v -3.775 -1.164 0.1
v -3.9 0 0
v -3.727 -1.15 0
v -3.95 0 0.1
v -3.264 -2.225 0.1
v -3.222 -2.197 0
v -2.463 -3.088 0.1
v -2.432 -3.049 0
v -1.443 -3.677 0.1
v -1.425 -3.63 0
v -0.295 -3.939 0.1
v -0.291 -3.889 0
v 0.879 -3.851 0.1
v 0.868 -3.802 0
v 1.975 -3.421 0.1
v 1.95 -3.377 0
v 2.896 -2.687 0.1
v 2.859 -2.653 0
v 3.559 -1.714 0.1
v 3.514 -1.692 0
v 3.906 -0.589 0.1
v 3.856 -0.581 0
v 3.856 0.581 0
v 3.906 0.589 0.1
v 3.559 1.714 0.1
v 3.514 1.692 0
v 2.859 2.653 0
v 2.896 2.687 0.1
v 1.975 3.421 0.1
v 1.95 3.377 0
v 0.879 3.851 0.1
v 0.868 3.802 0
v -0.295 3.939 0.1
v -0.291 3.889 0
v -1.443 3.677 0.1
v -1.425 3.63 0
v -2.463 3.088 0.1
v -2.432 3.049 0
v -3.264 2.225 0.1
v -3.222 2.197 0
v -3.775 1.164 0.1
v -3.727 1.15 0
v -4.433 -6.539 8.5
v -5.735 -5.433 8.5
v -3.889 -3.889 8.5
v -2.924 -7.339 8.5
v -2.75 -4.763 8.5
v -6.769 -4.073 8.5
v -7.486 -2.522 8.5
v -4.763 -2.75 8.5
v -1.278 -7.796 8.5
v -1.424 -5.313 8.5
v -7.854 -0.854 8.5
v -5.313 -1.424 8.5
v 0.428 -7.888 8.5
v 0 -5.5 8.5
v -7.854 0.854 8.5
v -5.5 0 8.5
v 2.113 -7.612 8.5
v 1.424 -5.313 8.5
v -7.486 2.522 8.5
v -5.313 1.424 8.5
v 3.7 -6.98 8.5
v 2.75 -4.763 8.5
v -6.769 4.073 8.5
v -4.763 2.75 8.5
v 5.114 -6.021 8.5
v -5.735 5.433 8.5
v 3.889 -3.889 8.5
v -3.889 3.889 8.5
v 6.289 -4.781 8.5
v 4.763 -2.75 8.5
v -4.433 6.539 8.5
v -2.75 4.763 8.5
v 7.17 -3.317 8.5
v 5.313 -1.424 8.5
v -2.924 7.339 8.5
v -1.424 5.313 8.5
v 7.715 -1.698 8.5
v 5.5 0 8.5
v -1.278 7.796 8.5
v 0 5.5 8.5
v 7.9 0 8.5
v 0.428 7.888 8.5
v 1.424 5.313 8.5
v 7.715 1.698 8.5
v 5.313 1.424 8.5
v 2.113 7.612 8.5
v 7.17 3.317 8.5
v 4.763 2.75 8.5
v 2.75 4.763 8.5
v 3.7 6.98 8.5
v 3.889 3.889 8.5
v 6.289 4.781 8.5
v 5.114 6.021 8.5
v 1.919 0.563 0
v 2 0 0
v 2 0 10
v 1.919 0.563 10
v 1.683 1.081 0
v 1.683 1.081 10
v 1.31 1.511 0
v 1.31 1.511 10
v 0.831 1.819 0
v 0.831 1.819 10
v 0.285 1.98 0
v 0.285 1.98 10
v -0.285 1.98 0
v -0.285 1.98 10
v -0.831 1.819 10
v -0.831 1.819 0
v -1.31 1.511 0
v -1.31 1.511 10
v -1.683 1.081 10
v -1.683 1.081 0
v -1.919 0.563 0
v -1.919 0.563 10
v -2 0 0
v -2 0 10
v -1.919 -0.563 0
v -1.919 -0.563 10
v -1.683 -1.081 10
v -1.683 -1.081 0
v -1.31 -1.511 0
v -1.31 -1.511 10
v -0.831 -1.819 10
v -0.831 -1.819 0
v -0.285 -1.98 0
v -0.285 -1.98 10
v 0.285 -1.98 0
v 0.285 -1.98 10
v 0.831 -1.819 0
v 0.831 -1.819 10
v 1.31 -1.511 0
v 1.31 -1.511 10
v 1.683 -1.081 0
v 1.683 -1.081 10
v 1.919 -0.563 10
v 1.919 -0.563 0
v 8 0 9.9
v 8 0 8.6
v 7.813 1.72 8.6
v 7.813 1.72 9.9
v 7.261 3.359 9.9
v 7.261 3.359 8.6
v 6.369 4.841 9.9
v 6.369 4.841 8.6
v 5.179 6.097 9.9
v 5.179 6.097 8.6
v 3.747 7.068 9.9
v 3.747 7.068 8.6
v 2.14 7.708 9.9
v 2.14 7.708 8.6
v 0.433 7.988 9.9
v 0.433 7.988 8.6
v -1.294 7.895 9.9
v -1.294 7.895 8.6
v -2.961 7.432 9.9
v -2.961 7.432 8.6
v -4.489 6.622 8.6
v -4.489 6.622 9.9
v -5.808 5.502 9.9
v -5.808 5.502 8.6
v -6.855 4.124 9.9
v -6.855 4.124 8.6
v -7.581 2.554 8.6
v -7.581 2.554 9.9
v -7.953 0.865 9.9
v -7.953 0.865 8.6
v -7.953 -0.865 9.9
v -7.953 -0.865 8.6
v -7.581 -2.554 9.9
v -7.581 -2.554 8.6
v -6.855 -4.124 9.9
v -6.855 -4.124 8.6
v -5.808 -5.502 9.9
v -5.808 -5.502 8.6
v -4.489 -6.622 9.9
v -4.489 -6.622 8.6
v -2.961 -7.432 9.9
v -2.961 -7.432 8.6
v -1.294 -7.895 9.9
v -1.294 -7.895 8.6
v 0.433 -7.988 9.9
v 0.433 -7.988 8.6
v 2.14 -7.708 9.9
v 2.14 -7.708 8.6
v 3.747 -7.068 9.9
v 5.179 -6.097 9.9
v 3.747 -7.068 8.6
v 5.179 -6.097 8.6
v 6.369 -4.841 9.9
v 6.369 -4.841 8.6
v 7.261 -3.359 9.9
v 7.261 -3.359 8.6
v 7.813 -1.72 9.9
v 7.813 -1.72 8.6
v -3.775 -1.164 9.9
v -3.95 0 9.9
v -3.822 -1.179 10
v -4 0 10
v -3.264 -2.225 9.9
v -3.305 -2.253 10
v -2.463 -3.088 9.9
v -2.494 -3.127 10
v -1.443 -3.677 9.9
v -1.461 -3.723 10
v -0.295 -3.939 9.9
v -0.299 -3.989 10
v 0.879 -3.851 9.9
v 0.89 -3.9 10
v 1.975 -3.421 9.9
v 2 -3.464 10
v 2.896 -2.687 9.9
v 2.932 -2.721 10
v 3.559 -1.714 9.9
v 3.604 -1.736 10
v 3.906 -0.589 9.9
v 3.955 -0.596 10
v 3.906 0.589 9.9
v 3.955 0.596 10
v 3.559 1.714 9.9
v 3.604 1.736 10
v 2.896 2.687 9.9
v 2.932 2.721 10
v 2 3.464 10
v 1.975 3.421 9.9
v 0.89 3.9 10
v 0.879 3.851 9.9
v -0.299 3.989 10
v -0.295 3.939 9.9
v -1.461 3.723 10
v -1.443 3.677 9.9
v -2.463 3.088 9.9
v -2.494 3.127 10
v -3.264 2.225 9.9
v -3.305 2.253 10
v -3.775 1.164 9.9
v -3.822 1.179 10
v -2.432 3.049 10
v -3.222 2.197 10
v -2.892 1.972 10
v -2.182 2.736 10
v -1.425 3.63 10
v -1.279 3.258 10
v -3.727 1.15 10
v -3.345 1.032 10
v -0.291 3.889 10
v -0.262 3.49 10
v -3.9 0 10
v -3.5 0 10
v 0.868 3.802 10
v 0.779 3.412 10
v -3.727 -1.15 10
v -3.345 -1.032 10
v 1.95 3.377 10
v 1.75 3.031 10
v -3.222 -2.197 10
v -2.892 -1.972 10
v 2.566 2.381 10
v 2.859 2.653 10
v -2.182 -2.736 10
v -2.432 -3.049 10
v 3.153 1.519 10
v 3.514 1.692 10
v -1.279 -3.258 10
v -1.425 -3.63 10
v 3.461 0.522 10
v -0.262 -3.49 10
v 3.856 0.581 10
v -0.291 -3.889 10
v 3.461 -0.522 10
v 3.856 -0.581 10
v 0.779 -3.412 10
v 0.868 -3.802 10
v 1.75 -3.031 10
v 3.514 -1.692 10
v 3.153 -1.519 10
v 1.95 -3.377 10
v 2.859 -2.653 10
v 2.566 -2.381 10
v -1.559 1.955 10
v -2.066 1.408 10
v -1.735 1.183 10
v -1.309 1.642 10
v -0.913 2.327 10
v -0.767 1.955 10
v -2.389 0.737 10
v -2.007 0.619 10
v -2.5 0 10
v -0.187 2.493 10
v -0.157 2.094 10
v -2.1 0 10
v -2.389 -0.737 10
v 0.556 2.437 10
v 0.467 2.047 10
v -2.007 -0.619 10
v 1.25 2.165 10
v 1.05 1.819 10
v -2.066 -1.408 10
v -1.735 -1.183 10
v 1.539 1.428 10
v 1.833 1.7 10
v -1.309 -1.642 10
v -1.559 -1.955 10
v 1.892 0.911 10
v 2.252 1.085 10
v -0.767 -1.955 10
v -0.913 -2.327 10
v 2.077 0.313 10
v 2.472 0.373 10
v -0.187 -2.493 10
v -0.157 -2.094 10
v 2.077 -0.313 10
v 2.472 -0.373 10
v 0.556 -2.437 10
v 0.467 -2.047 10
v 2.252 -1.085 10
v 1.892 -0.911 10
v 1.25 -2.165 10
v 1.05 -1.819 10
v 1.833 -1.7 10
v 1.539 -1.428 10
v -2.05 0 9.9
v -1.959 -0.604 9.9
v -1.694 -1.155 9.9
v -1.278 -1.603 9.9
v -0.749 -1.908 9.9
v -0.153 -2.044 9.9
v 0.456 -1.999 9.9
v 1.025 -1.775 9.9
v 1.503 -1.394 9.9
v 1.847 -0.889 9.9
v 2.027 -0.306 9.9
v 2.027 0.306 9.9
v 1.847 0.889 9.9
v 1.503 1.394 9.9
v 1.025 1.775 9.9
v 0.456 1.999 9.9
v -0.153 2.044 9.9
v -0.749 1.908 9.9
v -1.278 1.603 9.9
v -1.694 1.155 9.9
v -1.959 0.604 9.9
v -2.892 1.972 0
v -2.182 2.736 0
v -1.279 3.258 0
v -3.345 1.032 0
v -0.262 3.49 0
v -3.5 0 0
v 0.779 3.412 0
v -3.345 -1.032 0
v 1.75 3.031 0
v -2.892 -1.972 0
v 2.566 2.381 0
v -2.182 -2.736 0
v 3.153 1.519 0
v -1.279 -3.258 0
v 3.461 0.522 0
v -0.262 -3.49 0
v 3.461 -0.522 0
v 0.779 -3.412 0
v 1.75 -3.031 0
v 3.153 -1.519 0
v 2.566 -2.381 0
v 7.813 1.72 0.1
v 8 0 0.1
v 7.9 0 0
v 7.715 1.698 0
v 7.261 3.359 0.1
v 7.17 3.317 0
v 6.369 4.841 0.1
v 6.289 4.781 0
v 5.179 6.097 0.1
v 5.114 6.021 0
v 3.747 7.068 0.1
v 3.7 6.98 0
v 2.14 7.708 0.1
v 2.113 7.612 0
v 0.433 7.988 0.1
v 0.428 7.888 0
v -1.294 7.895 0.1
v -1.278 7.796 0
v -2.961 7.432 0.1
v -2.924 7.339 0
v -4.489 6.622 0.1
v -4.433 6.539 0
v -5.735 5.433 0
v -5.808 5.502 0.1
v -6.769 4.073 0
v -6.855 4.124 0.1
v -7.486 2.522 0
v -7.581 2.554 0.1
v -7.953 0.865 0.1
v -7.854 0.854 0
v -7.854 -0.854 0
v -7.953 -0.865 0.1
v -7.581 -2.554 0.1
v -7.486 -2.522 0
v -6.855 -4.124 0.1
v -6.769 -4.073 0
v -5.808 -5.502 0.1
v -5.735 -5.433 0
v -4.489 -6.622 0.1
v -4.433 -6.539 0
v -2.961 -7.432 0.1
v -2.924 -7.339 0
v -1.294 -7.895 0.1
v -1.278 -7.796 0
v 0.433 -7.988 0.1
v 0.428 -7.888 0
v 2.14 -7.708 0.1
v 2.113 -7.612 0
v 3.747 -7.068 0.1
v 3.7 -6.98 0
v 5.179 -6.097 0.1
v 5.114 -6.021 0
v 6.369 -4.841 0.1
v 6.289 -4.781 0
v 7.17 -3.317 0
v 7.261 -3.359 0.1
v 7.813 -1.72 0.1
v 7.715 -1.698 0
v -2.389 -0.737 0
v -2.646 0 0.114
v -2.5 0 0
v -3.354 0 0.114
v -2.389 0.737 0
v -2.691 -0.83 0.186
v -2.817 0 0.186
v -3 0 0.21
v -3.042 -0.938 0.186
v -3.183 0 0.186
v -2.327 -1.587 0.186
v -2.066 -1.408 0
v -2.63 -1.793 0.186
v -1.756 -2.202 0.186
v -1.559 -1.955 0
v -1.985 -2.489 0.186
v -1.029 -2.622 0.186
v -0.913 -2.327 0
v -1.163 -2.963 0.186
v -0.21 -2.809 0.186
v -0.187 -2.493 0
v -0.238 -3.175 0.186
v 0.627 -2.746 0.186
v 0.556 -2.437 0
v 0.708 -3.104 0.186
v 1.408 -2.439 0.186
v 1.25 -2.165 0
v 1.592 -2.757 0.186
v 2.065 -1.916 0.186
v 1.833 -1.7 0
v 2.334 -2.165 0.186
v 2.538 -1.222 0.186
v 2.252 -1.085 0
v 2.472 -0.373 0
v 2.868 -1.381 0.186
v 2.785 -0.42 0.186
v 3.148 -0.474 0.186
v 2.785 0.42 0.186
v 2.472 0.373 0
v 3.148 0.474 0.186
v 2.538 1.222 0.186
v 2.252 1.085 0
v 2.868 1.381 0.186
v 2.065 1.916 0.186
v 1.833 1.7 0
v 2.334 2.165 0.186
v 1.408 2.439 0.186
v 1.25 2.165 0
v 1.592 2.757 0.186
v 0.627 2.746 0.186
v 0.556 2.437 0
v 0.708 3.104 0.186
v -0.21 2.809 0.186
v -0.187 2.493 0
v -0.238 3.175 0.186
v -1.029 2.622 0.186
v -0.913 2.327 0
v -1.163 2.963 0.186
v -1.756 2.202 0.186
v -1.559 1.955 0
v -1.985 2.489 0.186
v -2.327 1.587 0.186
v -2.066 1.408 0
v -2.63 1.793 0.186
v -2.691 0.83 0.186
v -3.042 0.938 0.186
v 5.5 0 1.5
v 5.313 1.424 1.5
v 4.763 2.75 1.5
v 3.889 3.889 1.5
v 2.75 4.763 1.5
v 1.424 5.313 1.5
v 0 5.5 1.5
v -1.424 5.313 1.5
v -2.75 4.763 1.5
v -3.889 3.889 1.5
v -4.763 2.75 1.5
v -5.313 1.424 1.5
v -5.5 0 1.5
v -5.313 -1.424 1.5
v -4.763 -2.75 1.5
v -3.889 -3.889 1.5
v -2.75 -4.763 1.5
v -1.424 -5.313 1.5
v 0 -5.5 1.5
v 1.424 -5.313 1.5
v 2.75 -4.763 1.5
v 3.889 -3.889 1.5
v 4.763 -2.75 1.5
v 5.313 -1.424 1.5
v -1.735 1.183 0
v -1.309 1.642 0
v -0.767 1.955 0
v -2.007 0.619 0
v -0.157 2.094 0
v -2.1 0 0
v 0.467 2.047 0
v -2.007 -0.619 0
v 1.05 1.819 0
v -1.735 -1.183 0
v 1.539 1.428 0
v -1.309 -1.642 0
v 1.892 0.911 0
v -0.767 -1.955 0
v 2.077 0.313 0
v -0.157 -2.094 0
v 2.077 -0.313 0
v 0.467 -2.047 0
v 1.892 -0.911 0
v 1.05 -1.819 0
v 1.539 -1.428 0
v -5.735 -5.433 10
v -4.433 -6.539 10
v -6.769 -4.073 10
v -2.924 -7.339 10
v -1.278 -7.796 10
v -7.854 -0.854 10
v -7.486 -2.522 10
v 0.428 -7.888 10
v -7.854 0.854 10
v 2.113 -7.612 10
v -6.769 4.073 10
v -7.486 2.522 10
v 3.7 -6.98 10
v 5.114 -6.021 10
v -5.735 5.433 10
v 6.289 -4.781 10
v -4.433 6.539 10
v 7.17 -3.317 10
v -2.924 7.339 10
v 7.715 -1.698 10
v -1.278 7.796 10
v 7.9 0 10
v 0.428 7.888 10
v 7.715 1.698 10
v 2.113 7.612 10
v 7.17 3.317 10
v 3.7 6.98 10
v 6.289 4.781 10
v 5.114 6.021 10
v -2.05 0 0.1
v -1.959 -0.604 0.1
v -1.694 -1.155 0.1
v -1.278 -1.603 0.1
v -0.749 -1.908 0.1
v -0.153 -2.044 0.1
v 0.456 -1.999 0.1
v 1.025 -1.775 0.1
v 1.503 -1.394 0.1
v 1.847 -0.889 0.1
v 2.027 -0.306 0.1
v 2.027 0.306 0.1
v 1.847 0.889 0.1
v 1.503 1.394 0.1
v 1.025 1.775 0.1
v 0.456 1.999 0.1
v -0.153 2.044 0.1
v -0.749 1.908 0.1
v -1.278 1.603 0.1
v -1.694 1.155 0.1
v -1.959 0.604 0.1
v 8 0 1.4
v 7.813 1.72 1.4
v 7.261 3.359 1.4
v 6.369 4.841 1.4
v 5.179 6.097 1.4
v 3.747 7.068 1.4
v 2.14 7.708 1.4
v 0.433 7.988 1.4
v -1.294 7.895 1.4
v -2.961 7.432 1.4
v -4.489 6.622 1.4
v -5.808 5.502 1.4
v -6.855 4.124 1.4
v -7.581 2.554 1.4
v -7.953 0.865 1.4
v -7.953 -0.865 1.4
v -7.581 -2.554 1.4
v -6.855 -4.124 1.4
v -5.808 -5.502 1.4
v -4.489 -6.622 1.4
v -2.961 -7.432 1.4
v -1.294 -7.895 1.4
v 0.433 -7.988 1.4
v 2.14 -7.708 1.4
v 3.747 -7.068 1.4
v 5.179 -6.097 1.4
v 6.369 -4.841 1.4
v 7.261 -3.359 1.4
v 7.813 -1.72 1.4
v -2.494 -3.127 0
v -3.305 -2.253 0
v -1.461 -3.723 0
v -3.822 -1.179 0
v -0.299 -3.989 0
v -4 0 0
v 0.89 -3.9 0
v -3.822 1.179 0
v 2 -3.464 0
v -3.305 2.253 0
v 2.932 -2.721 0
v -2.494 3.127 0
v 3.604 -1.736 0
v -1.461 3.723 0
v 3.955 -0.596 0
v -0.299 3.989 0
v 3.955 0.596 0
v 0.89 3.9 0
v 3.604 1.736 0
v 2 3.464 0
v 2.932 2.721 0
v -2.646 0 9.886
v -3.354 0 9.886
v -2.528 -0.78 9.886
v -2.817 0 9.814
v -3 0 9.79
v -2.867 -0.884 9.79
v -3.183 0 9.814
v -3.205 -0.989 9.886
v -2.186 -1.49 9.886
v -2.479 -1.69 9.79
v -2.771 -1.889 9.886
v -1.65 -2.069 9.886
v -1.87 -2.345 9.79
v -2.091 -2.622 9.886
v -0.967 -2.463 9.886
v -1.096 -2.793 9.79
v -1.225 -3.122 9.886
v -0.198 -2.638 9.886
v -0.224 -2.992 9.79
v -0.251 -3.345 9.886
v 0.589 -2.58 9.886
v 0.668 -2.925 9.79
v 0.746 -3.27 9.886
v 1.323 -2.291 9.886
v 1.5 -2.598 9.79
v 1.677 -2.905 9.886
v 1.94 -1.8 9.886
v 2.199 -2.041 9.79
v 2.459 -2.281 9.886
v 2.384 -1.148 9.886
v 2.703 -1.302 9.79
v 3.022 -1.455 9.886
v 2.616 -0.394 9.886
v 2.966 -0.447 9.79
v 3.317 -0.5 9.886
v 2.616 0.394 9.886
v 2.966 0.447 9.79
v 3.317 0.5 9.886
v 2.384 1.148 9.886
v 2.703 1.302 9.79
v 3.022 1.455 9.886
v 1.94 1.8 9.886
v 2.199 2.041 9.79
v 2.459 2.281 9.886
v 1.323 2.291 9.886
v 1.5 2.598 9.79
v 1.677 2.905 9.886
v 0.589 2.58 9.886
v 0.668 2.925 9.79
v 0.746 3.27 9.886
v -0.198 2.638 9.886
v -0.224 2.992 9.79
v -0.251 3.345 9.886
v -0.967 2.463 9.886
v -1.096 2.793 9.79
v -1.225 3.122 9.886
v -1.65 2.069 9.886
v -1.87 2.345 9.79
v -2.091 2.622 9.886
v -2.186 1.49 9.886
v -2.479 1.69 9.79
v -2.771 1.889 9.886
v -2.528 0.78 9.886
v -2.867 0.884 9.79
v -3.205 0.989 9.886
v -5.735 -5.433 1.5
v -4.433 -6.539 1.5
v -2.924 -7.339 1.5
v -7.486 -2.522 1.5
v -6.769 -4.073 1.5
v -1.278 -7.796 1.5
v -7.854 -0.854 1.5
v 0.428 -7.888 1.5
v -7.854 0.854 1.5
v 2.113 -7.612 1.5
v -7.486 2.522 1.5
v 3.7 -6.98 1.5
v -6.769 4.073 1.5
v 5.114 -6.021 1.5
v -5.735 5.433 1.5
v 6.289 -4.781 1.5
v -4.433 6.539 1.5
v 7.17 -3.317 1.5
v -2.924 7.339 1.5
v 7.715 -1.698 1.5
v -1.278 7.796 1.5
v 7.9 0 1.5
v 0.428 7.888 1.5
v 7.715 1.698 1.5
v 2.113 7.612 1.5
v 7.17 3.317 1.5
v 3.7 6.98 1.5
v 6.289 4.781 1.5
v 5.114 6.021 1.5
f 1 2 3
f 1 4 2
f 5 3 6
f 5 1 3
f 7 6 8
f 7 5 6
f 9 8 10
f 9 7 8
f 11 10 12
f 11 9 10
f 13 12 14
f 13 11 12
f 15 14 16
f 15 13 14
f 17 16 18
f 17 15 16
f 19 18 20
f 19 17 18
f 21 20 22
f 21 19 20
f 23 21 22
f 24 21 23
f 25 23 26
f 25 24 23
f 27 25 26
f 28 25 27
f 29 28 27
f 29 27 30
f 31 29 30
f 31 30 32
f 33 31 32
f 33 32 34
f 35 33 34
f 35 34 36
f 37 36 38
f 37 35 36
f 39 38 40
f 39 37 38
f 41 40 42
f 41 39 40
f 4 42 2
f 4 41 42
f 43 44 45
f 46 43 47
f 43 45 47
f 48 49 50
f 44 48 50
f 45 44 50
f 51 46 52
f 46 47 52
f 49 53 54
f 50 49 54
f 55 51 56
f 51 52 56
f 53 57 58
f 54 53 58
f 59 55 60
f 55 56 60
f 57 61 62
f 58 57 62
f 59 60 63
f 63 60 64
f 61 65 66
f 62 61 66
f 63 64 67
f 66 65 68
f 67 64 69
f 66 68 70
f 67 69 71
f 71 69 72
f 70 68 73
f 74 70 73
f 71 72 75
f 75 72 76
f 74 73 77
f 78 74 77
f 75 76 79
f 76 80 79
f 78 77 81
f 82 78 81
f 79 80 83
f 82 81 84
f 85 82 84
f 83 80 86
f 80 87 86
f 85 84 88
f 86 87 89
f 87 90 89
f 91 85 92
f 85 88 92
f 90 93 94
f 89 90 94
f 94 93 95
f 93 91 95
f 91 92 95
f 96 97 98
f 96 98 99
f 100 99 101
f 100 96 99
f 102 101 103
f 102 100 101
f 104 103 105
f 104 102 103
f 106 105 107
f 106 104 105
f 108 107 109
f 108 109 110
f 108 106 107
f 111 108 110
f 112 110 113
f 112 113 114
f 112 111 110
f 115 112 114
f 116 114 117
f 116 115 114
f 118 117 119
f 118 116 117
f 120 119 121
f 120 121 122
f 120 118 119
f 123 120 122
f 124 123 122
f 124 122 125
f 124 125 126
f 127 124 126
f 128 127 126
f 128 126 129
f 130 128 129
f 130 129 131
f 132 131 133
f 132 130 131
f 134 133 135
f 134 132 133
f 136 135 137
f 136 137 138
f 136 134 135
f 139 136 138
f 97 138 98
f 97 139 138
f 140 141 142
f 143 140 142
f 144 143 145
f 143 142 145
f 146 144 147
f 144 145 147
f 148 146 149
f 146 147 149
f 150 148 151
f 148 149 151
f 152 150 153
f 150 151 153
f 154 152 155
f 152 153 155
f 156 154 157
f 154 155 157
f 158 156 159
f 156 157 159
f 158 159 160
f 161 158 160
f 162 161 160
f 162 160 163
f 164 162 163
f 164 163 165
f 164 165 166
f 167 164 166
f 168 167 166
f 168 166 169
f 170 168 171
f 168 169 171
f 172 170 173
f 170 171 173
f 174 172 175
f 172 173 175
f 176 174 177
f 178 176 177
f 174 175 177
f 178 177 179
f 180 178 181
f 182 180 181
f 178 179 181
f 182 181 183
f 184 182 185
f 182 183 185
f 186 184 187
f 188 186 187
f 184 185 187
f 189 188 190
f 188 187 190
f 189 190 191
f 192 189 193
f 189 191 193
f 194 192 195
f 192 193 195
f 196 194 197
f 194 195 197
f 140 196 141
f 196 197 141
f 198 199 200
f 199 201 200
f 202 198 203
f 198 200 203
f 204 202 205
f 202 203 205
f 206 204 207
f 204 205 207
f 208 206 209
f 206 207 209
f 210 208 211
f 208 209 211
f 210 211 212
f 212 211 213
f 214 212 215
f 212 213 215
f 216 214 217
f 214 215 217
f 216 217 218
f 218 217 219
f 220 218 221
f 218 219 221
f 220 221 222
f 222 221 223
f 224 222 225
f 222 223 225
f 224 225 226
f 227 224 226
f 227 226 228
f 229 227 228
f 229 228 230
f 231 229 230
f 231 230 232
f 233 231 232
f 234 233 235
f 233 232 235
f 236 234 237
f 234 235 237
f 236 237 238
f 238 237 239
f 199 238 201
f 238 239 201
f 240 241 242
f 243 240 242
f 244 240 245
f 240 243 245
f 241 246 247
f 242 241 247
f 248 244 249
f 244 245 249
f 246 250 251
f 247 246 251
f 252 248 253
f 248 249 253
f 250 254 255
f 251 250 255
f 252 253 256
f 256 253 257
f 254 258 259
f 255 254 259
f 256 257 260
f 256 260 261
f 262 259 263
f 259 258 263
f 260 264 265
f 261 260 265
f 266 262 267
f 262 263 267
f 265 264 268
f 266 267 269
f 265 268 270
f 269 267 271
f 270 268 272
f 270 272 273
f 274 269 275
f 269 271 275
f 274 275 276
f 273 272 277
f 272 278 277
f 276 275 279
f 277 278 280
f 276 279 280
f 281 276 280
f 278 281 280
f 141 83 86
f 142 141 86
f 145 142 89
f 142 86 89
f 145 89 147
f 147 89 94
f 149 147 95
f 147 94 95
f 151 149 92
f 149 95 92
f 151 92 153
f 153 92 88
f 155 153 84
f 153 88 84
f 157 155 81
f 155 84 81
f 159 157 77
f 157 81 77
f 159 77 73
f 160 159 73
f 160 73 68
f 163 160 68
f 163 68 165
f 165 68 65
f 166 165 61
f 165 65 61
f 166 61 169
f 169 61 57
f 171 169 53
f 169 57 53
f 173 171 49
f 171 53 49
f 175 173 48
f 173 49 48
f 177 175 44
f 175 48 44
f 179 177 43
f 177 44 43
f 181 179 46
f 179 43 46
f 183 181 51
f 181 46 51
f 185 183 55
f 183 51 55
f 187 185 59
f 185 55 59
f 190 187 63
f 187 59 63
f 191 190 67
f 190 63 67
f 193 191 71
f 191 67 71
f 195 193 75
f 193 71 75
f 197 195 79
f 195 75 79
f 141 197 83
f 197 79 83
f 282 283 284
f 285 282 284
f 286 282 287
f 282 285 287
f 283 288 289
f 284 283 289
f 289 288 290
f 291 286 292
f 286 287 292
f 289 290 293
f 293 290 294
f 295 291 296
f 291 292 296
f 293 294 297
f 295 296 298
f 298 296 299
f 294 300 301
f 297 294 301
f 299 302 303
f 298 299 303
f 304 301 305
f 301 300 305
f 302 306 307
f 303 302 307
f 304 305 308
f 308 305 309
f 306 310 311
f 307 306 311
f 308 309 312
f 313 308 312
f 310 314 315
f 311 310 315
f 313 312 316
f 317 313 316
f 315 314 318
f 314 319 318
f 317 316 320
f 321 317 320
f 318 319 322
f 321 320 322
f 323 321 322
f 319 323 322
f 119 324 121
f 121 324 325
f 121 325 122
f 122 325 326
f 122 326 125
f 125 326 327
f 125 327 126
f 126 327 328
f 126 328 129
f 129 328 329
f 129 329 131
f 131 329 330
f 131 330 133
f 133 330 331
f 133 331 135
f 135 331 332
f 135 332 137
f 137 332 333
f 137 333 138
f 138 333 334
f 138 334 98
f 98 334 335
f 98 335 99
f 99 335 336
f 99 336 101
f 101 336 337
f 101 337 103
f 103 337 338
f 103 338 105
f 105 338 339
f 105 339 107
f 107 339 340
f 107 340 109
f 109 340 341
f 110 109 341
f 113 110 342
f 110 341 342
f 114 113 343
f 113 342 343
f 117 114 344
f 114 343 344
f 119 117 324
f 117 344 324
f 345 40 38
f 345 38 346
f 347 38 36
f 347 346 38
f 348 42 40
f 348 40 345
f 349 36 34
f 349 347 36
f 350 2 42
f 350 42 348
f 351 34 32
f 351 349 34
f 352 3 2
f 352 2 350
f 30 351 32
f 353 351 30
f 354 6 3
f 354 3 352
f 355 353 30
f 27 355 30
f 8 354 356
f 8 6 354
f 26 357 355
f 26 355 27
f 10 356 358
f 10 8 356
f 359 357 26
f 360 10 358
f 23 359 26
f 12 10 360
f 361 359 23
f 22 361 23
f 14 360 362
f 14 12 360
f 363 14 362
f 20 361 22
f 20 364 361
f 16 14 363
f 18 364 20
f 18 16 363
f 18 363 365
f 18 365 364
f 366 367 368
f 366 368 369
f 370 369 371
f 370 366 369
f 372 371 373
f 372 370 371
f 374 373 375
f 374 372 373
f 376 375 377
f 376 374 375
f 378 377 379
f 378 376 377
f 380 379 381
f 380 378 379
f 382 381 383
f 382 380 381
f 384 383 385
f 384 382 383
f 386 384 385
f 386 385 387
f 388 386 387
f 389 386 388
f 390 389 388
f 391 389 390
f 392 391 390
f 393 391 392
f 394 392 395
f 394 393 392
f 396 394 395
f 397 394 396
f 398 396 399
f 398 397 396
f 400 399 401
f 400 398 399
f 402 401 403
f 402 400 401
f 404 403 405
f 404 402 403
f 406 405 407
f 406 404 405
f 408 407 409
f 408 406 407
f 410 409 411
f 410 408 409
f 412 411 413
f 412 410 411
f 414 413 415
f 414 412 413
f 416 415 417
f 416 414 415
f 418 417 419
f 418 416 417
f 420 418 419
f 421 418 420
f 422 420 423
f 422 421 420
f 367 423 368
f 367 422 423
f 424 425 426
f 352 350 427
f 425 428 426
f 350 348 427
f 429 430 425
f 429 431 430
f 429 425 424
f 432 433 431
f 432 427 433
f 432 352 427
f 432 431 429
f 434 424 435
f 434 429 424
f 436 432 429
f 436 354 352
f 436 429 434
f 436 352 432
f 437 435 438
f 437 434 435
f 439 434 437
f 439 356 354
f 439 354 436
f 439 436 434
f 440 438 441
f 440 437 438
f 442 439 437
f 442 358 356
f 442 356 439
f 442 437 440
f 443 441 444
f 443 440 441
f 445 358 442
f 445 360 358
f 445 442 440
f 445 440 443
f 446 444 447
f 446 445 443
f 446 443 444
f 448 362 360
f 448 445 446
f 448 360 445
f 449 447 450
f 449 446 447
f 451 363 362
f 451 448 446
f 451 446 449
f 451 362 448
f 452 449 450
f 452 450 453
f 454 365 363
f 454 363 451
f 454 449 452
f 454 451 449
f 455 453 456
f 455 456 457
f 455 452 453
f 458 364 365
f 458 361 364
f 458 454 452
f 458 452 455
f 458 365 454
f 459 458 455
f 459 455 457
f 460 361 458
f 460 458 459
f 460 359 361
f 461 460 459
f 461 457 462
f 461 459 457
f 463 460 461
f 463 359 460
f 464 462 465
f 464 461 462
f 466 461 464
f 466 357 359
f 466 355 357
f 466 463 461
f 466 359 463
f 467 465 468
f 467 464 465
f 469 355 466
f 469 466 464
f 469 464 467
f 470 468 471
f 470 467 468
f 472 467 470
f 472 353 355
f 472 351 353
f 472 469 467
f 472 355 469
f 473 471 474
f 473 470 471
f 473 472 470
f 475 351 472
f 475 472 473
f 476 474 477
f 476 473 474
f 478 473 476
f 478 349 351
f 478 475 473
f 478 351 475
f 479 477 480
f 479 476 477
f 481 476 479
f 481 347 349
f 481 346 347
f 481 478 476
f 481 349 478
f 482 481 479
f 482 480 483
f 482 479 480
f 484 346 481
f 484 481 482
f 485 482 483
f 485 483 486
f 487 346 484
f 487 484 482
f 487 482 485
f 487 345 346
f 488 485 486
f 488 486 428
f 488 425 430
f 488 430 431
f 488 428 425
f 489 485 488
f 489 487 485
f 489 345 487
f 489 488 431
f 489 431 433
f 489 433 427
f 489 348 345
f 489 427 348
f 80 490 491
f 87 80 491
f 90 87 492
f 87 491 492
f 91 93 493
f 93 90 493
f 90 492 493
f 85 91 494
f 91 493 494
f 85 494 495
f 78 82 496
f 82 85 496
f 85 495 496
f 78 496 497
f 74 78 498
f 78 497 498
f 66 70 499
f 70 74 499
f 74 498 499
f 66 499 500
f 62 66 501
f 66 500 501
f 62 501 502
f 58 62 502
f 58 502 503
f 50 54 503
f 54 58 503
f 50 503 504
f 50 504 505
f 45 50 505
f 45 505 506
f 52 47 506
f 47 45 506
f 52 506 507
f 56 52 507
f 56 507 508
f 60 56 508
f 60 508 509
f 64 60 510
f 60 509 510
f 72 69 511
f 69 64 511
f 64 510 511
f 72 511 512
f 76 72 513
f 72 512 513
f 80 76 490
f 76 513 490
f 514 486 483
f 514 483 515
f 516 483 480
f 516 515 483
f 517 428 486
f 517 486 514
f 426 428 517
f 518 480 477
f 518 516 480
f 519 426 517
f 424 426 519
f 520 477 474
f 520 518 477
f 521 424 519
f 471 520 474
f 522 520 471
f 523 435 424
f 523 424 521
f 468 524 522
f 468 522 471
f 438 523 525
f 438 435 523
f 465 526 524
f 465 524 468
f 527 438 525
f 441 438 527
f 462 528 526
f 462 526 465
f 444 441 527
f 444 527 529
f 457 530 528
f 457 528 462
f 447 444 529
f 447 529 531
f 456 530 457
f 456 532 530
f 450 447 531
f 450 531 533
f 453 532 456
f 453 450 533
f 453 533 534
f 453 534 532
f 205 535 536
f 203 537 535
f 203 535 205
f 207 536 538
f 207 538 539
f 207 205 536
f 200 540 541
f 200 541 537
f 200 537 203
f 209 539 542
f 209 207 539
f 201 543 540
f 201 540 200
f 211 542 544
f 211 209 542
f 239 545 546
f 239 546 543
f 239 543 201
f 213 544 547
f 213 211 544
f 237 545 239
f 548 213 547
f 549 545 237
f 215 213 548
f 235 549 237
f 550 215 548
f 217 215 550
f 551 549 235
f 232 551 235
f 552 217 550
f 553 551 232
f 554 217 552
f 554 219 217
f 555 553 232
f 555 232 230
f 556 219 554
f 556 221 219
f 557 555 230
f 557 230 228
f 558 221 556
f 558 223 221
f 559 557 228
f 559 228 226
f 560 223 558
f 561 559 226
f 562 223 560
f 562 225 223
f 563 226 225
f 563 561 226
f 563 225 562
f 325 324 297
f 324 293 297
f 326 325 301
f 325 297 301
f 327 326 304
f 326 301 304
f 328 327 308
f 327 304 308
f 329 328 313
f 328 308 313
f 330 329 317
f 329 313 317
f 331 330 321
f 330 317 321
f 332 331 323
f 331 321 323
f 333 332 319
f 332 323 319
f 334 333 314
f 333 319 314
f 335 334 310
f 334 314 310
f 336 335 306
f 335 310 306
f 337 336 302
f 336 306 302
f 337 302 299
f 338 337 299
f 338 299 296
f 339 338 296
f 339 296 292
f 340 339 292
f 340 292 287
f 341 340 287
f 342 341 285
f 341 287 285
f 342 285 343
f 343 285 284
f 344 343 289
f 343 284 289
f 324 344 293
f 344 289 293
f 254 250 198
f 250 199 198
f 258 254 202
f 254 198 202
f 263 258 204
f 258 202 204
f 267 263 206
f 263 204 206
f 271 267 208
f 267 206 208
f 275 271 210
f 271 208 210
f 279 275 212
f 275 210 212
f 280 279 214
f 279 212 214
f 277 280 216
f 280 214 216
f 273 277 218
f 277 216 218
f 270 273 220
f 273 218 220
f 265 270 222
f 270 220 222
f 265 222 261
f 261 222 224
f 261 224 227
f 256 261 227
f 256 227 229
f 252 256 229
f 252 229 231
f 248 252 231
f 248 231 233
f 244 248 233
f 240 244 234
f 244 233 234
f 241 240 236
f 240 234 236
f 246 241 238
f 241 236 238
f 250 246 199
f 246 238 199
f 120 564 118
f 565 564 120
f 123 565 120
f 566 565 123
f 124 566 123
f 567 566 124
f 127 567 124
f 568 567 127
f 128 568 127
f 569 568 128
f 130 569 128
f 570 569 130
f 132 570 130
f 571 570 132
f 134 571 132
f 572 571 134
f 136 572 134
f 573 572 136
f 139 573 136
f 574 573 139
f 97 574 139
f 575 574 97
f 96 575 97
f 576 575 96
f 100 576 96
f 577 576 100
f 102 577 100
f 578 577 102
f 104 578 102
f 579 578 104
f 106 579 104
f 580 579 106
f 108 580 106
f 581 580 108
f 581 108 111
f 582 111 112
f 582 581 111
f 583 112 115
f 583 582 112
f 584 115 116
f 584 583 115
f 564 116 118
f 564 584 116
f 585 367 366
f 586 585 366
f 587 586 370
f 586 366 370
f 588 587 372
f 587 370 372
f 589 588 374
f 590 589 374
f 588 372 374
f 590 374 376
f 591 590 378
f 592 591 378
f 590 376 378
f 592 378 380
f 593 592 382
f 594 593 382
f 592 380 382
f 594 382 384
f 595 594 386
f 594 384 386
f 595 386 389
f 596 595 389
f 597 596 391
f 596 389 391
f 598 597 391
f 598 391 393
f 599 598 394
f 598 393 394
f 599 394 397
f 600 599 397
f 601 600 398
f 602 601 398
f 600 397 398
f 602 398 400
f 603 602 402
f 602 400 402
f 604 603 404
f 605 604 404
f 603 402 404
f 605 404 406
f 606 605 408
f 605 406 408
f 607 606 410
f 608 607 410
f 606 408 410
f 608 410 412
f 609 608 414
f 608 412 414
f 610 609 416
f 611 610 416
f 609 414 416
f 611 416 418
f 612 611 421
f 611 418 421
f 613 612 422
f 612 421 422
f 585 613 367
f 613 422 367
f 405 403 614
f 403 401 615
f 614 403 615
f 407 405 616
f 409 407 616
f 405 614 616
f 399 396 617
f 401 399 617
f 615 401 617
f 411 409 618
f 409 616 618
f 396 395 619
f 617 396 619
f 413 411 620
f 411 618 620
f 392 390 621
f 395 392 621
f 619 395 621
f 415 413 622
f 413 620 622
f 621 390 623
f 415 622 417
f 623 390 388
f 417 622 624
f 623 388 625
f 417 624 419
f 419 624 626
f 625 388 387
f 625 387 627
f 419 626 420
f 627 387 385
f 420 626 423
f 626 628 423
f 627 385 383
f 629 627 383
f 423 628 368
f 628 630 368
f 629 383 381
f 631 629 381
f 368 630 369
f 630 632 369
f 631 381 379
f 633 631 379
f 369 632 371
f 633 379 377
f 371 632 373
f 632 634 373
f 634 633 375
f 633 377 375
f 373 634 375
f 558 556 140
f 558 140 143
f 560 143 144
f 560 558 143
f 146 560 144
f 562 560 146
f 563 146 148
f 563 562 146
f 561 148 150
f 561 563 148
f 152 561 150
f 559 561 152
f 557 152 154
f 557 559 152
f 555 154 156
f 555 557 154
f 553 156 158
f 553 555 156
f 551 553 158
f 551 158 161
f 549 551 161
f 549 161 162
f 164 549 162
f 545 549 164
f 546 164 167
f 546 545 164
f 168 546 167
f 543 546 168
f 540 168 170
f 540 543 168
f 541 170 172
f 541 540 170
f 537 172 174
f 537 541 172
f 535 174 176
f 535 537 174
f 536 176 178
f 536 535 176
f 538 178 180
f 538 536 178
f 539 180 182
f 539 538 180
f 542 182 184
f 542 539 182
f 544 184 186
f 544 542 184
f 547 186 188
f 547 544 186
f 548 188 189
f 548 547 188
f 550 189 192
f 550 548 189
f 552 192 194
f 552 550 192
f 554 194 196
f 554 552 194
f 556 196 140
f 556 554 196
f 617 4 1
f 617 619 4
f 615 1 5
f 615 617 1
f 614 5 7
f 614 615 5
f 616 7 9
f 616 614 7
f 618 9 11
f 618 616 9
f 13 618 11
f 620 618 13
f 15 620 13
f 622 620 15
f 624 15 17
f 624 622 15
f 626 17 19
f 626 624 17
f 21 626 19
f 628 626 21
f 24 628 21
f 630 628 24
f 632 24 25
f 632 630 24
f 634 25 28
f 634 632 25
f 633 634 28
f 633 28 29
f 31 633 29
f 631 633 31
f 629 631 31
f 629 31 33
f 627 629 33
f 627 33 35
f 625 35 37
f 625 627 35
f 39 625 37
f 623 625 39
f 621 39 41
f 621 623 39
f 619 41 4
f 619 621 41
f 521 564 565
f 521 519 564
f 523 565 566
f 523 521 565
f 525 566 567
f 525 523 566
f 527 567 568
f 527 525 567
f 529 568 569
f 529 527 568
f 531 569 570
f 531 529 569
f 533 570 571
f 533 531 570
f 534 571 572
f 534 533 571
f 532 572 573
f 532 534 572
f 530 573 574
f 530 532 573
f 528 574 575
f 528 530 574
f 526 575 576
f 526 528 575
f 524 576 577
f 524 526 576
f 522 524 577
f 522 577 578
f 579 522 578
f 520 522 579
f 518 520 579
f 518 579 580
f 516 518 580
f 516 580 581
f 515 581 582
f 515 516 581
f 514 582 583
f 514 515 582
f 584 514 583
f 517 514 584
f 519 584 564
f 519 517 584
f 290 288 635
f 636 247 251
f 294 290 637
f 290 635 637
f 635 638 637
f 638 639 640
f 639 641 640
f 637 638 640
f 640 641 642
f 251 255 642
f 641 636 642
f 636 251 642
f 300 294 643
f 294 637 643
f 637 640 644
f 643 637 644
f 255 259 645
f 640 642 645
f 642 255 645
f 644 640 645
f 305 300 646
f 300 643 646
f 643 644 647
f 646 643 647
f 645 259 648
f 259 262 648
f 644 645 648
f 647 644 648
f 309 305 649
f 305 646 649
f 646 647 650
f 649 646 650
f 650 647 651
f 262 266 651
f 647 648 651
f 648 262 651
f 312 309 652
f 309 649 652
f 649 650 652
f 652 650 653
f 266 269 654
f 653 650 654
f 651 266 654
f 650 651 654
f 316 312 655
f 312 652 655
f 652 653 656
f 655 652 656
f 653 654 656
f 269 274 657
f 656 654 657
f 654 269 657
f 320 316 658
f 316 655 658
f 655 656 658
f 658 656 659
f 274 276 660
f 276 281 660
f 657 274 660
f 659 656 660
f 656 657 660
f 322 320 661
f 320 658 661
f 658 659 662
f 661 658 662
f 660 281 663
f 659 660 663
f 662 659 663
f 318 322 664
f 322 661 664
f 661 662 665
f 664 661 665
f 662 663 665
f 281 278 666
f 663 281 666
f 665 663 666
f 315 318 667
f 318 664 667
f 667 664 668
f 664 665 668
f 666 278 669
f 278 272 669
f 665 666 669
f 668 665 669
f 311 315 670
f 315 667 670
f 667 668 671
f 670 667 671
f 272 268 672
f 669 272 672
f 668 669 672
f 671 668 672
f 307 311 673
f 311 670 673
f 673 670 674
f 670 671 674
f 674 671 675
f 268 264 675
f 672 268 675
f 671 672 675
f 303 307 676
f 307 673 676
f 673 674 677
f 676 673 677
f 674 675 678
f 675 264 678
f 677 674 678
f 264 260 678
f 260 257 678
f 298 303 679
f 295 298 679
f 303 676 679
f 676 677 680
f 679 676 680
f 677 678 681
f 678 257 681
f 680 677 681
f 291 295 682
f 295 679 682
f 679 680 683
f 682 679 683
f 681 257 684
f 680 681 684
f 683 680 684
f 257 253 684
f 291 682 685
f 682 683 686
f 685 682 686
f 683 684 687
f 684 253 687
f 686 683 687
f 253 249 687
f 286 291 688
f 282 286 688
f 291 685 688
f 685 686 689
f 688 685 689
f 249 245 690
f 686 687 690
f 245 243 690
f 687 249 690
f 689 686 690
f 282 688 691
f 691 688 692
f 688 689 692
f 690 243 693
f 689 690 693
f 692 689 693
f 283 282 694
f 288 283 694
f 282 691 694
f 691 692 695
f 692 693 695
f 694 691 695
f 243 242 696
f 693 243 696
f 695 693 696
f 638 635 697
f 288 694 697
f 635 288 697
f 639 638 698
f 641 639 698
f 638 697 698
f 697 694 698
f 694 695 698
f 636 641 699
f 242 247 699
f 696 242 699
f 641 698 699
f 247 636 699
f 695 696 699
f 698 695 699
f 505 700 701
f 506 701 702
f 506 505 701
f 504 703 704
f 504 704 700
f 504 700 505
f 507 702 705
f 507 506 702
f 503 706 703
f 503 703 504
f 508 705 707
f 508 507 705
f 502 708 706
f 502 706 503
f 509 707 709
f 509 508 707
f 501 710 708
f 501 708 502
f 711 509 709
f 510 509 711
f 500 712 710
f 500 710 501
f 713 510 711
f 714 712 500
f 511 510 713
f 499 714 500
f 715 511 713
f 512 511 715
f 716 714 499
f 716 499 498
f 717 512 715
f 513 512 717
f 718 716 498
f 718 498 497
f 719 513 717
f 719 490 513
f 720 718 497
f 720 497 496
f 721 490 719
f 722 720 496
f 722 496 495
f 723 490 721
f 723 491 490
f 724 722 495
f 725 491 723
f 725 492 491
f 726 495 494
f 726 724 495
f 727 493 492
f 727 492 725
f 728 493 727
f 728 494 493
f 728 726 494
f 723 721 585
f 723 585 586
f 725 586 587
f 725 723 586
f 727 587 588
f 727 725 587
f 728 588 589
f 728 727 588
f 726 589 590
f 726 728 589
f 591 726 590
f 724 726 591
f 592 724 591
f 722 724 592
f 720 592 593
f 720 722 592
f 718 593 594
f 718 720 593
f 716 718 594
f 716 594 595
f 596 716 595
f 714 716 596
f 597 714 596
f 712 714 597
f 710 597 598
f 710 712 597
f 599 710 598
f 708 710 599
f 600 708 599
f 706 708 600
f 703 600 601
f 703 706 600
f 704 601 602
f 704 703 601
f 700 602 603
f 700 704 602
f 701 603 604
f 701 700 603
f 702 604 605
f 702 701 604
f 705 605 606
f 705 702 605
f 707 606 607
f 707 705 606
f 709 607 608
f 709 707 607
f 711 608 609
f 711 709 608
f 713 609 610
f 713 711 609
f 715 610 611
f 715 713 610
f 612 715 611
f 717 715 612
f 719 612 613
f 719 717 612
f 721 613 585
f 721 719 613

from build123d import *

# Parameters (mm, degrees)
CROQUIS1_R              = 5.5
CROQUIS1_R_2            = 2
SALIENTE_EXTRUIR1_DEPTH = 10
CROQUIS2_R              = 8
CROQUIS2_R_2            = 2
SALIENTE_EXTRUIR3_DEPTH = 1.5
SALIENTE_EXTRUIR5_START = 8.5
CROQUIS2_3_R            = 8
CROQUIS2_3_R_2          = 2
SALIENTE_EXTRUIR5_DEPTH = 1.5
CHAFL_N1_SIZE           = 0.1


with BuildPart() as part:
    # Croquis1 → Saliente-Extruir1 (new body)
    with BuildSketch(Plane.XY):
        Circle(CROQUIS1_R)
        Circle(CROQUIS1_R_2, mode=Mode.SUBTRACT)
    extrude(amount=SALIENTE_EXTRUIR1_DEPTH)

    # Croquis2 → Saliente-Extruir3 (add)
    with BuildSketch(Plane.XY):
        Circle(CROQUIS2_R)
        Circle(CROQUIS2_R_2, mode=Mode.SUBTRACT)
    extrude(amount=SALIENTE_EXTRUIR3_DEPTH)

    # Croquis2<3> → Saliente-Extruir5 (add)
    with BuildSketch(Plane.XY.offset(SALIENTE_EXTRUIR5_START)):
        Circle(CROQUIS2_3_R)
        Circle(CROQUIS2_3_R_2, mode=Mode.SUBTRACT)
    extrude(amount=SALIENTE_EXTRUIR5_DEPTH)

    # Chaflán1
    chafl_n1_edges = [part.edges().sort_by_distance(p)[0] for p in [
        (-8, 0, 1.5),
        (-8, 0, 0),
        (-8, 0, 10),
        (-8, 0, 8.5),
    ]]
    chamfer(chafl_n1_edges, length=CHAFL_N1_SIZE)

    # Croquis3 → Cortar-Revolución1 (revolve, cut)
    with BuildSketch(Plane(origin=(0, 0, 0), x_dir=(1, 0, 0), z_dir=(0, 1, 0))):
        with BuildLine():
            Line((-2, 0), (-2.05, -0.1))
            Line((-2.05, -0.1), (-2.1, 0))
            Line((-2.1, 0), (-2.5, 0))
            ThreePointArc((-2.5, 0), (-3, -0.210102051), (-3.5, 0))
            Line((-3.5, 0), (-3.9, 0))
            Line((-3.9, 0), (-3.95, -0.1))
            Line((-3.95, -0.1), (-4, 0))
            Line((-4, 0), (-4, 0.1))
            Line((-4, 0.1), (-2, 0.1))
            Line((-2, 0.1), (-2, 0))
        make_face()
        with BuildLine():
            Line((-2, -10.1), (-2, -10))
            Line((-2, -10), (-2.05, -9.9))
            Line((-2.05, -9.9), (-2.1, -10))
            Line((-2.1, -10), (-2.5, -10))
            ThreePointArc((-2.5, -10), (-3, -9.789897949), (-3.5, -10))
            Line((-3.5, -10), (-3.9, -10))
            Line((-3.9, -10), (-3.95, -9.9))
            Line((-3.95, -9.9), (-4, -10))
            Line((-4, -10), (-4, -10.1))
            Line((-4, -10.1), (-2, -10.1))
        make_face()
    revolve(axis=Axis((0, 0, 0), (0, 0, 1)), mode=Mode.SUBTRACT)


solid = part.part
